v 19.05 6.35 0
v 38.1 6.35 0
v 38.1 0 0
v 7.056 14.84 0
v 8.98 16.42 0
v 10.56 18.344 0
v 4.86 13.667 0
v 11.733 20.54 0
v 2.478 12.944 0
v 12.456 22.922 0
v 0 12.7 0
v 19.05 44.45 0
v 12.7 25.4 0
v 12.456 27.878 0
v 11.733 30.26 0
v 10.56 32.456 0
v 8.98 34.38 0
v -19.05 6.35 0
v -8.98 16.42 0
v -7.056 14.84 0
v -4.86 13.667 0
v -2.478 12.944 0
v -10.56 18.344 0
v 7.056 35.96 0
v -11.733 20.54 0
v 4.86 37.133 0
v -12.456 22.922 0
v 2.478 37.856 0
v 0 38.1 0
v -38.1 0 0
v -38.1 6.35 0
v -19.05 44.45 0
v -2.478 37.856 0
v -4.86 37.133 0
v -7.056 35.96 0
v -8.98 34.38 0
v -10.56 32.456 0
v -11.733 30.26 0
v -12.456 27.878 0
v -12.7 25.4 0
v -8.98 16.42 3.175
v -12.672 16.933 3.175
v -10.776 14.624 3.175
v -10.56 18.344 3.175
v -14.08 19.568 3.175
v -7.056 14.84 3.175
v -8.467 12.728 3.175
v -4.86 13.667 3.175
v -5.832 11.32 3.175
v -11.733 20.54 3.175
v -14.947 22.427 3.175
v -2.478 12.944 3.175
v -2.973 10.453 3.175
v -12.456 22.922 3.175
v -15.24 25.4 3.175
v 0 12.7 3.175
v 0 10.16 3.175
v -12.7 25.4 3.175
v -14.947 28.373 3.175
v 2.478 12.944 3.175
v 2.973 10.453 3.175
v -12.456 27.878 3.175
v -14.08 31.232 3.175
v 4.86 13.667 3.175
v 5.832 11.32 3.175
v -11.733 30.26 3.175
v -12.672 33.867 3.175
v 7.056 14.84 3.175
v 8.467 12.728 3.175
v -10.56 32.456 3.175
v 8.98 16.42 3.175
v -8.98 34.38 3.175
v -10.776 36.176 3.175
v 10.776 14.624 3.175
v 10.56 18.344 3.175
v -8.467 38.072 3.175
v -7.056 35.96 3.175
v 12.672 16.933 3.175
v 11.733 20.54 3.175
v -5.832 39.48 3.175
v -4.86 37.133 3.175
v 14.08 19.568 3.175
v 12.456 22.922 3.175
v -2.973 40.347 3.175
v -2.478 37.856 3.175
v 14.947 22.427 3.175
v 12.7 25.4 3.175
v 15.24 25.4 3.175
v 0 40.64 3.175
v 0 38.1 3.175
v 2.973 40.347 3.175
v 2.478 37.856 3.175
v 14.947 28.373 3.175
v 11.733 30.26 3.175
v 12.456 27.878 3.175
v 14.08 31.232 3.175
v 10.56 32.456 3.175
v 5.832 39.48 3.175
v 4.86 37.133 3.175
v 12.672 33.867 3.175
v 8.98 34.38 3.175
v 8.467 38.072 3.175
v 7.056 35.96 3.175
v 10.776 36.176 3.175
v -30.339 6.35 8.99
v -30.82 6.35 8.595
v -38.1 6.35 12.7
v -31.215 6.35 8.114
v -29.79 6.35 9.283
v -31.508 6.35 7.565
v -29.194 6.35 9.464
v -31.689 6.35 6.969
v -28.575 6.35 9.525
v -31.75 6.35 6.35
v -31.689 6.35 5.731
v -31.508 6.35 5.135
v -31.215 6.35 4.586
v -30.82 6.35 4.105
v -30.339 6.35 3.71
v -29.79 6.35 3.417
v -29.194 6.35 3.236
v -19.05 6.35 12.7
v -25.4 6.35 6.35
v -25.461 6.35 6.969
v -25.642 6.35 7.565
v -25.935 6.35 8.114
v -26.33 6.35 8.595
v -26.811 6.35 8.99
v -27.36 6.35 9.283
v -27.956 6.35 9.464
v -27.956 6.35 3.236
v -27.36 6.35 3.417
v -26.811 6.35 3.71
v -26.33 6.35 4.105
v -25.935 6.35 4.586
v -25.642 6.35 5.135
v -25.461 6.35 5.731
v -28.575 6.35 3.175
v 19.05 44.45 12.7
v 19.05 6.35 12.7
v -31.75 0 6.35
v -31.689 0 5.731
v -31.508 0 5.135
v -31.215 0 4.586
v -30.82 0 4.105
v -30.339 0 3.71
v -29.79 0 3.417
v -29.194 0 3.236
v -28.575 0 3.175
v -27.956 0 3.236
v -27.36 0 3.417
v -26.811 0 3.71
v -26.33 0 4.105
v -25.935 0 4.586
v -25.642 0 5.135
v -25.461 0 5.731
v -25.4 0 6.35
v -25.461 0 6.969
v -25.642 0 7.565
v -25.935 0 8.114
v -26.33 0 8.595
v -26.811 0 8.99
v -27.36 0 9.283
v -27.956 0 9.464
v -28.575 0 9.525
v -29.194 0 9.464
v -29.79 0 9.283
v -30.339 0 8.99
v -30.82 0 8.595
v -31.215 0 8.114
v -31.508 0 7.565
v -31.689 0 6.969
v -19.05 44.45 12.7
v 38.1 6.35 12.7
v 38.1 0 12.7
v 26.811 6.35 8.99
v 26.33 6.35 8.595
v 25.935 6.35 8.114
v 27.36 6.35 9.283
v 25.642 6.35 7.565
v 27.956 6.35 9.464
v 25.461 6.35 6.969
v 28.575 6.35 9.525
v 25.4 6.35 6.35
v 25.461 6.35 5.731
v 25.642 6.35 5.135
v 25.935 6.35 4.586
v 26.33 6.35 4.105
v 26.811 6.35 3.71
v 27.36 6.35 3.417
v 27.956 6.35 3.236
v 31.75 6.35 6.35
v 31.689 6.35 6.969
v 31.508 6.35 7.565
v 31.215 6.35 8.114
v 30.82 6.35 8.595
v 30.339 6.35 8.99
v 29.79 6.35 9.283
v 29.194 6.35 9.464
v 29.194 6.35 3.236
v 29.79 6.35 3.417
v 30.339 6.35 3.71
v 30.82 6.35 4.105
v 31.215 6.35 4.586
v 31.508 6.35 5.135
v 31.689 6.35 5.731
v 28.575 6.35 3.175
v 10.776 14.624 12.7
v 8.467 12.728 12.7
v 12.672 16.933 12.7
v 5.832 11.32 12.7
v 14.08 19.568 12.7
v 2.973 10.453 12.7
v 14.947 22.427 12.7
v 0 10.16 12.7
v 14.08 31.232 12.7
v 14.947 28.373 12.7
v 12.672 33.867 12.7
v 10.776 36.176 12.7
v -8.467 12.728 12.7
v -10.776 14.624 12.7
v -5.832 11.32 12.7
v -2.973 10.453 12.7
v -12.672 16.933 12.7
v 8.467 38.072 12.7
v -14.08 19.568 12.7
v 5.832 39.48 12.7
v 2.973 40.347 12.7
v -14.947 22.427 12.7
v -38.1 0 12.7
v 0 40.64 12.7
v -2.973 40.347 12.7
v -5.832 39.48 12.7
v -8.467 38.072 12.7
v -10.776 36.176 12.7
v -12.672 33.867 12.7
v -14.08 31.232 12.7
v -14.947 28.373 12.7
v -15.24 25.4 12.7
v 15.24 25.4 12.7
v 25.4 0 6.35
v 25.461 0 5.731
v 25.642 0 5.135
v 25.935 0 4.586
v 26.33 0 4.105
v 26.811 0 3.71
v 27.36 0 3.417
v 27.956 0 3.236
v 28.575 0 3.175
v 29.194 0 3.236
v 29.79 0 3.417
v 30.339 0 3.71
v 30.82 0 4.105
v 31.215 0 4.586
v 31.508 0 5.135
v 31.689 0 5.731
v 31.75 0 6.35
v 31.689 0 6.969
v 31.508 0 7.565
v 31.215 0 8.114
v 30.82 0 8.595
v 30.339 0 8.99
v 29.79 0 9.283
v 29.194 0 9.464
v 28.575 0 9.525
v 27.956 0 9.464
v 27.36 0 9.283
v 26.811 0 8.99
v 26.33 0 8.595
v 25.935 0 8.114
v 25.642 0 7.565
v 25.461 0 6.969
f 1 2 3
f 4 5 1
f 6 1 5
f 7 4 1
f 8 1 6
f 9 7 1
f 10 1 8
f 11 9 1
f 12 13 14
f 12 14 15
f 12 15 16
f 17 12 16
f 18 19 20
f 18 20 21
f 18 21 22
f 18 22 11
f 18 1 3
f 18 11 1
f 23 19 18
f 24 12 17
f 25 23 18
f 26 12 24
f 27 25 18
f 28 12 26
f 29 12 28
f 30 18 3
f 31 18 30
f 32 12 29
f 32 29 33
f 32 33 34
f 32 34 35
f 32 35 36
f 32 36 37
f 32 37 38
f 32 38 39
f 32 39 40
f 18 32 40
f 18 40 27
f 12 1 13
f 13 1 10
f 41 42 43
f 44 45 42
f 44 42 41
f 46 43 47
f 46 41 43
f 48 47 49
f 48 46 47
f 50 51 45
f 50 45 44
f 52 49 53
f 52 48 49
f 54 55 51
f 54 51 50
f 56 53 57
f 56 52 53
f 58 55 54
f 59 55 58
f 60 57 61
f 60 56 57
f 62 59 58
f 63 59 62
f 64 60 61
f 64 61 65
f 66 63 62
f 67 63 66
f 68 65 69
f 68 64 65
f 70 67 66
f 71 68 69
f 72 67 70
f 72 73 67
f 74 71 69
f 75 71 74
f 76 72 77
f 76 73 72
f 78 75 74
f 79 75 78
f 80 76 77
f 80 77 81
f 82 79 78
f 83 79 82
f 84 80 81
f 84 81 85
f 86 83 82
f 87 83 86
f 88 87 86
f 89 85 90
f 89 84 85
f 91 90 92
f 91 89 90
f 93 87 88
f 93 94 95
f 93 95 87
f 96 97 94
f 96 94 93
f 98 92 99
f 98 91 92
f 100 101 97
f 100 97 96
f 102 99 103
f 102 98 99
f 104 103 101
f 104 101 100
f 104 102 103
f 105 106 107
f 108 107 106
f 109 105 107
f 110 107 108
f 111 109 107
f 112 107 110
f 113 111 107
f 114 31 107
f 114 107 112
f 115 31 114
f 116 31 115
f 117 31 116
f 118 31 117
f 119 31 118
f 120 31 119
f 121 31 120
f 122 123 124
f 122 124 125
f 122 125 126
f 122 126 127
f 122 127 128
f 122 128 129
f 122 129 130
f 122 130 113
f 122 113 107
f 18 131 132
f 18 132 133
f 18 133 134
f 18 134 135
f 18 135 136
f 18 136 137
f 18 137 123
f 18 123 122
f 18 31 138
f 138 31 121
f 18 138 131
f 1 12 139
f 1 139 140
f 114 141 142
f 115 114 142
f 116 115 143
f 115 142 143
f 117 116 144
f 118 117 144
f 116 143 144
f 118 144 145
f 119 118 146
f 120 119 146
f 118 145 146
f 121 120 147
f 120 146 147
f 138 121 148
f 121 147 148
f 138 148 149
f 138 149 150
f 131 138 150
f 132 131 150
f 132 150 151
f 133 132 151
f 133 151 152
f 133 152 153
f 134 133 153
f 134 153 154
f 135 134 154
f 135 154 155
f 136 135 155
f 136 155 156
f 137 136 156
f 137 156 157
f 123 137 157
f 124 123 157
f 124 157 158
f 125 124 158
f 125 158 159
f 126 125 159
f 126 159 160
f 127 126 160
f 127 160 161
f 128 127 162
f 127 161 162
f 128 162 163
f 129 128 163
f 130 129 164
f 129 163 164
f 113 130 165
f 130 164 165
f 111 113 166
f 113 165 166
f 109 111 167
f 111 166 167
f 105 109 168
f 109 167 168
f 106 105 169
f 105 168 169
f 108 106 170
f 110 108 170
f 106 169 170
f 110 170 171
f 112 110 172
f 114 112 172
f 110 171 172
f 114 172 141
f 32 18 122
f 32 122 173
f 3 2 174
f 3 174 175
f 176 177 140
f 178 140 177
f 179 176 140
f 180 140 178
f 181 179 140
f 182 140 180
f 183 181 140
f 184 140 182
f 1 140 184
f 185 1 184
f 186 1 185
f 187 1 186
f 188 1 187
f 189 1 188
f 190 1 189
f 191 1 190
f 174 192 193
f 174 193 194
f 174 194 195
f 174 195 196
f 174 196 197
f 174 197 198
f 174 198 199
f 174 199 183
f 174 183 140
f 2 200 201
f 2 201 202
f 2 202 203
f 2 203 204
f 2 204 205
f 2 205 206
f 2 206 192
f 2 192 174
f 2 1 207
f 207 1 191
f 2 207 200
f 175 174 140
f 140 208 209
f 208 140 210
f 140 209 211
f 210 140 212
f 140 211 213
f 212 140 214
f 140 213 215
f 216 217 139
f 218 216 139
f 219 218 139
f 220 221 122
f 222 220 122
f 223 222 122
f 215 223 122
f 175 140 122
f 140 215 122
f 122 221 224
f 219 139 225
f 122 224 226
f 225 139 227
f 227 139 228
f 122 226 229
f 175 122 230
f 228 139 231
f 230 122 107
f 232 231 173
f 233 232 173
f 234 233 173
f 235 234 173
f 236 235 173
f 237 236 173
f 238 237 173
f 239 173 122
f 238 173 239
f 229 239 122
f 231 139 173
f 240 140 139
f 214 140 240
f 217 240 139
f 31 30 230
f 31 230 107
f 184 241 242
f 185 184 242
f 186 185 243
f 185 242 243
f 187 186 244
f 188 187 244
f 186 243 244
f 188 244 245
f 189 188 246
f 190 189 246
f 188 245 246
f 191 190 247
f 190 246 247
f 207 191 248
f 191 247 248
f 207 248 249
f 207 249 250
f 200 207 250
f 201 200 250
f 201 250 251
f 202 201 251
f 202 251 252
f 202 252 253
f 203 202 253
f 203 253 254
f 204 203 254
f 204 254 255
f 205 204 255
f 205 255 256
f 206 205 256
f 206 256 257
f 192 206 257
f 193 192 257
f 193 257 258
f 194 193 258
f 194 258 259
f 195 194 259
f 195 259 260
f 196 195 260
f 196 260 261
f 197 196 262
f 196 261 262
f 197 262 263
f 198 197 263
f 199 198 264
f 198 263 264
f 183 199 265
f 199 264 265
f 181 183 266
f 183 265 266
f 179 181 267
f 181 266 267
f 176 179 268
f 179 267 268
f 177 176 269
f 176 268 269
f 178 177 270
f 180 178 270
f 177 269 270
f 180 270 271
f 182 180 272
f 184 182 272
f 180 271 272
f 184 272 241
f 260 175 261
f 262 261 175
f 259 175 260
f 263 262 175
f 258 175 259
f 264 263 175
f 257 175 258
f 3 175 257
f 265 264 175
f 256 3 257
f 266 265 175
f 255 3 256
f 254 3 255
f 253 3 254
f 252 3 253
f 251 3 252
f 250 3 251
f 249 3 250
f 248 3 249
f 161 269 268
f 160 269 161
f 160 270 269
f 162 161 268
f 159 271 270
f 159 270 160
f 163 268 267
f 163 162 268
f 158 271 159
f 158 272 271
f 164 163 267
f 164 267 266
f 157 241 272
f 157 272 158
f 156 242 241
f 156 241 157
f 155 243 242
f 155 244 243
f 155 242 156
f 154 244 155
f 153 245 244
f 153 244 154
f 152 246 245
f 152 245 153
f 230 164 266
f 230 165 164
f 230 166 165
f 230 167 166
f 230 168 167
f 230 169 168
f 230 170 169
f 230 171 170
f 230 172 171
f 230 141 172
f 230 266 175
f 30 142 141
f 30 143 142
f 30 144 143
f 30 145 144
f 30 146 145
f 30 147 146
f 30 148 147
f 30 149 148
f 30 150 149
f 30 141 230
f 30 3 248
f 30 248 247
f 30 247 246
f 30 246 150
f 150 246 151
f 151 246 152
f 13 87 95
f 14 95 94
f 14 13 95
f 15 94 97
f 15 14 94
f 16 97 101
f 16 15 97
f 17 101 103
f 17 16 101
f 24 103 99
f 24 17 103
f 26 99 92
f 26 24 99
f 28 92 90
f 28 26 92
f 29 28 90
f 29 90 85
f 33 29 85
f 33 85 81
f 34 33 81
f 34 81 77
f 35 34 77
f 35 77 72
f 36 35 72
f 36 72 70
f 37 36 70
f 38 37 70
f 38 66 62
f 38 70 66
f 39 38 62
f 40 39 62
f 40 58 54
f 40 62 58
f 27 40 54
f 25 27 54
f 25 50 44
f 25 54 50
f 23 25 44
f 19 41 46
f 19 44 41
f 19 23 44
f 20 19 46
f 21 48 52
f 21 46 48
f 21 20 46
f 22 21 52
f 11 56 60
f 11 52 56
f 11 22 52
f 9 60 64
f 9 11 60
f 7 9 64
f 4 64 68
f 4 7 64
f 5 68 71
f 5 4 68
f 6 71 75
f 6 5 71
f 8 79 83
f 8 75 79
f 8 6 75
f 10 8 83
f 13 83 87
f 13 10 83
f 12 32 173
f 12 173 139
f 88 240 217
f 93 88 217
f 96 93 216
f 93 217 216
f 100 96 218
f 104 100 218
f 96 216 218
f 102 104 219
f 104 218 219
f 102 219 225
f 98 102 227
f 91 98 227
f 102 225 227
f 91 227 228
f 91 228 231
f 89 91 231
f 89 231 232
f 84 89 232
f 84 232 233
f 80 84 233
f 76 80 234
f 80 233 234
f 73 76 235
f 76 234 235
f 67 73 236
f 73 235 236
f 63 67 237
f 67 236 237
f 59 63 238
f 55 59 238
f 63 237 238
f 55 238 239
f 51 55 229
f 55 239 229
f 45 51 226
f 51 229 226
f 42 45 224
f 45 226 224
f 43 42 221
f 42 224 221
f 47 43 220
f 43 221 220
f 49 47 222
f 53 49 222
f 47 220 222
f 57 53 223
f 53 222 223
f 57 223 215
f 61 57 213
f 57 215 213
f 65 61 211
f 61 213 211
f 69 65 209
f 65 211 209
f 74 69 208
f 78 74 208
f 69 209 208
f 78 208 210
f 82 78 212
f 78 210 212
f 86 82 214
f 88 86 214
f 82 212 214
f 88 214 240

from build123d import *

# Parameters (mm, degrees)
SKETCH1_R                   = 12.7
BOSS_EXTRUDE1_DEPTH         = 12.7
SKETCH2_R                   = 15.24
CUT_EXTRUDE1_DEPTH          = 9.525
F_1_4_0_25_DIAMETER_HOLE1_D = 6.35


with BuildPart() as part:
    # Sketch1 → Boss-Extrude1 (new body)
    with BuildSketch(Plane.XY):
        Polygon((38.1, 0), (-38.1, 0), (-38.1, 6.35), (-19.05, 6.35), (-19.05, 44.45), (19.05, 44.45), (19.05, 6.35), (38.1, 6.35), align=None)
        with Locations((0, 25.4)):
            Circle(SKETCH1_R, mode=Mode.SUBTRACT)
    extrude(amount=BOSS_EXTRUDE1_DEPTH)

    # Sketch2 → Cut-Extrude1 (cut)
    with BuildSketch(Plane.XY.offset(12.7)):
        with Locations((0, 25.4)):
            Circle(SKETCH2_R)
    extrude(amount=-CUT_EXTRUDE1_DEPTH, mode=Mode.SUBTRACT)

    # 1/4 (0.25) Diameter Hole1 (through all)
    with Locations(Plane(origin=(-28.575, 6.35, 6.35), x_dir=(1, 0, 0), z_dir=(0, 1, 0))):
        with Locations((0, 0), (57.15, 0)):
            Hole(F_1_4_0_25_DIAMETER_HOLE1_D / 2)


solid = part.part
